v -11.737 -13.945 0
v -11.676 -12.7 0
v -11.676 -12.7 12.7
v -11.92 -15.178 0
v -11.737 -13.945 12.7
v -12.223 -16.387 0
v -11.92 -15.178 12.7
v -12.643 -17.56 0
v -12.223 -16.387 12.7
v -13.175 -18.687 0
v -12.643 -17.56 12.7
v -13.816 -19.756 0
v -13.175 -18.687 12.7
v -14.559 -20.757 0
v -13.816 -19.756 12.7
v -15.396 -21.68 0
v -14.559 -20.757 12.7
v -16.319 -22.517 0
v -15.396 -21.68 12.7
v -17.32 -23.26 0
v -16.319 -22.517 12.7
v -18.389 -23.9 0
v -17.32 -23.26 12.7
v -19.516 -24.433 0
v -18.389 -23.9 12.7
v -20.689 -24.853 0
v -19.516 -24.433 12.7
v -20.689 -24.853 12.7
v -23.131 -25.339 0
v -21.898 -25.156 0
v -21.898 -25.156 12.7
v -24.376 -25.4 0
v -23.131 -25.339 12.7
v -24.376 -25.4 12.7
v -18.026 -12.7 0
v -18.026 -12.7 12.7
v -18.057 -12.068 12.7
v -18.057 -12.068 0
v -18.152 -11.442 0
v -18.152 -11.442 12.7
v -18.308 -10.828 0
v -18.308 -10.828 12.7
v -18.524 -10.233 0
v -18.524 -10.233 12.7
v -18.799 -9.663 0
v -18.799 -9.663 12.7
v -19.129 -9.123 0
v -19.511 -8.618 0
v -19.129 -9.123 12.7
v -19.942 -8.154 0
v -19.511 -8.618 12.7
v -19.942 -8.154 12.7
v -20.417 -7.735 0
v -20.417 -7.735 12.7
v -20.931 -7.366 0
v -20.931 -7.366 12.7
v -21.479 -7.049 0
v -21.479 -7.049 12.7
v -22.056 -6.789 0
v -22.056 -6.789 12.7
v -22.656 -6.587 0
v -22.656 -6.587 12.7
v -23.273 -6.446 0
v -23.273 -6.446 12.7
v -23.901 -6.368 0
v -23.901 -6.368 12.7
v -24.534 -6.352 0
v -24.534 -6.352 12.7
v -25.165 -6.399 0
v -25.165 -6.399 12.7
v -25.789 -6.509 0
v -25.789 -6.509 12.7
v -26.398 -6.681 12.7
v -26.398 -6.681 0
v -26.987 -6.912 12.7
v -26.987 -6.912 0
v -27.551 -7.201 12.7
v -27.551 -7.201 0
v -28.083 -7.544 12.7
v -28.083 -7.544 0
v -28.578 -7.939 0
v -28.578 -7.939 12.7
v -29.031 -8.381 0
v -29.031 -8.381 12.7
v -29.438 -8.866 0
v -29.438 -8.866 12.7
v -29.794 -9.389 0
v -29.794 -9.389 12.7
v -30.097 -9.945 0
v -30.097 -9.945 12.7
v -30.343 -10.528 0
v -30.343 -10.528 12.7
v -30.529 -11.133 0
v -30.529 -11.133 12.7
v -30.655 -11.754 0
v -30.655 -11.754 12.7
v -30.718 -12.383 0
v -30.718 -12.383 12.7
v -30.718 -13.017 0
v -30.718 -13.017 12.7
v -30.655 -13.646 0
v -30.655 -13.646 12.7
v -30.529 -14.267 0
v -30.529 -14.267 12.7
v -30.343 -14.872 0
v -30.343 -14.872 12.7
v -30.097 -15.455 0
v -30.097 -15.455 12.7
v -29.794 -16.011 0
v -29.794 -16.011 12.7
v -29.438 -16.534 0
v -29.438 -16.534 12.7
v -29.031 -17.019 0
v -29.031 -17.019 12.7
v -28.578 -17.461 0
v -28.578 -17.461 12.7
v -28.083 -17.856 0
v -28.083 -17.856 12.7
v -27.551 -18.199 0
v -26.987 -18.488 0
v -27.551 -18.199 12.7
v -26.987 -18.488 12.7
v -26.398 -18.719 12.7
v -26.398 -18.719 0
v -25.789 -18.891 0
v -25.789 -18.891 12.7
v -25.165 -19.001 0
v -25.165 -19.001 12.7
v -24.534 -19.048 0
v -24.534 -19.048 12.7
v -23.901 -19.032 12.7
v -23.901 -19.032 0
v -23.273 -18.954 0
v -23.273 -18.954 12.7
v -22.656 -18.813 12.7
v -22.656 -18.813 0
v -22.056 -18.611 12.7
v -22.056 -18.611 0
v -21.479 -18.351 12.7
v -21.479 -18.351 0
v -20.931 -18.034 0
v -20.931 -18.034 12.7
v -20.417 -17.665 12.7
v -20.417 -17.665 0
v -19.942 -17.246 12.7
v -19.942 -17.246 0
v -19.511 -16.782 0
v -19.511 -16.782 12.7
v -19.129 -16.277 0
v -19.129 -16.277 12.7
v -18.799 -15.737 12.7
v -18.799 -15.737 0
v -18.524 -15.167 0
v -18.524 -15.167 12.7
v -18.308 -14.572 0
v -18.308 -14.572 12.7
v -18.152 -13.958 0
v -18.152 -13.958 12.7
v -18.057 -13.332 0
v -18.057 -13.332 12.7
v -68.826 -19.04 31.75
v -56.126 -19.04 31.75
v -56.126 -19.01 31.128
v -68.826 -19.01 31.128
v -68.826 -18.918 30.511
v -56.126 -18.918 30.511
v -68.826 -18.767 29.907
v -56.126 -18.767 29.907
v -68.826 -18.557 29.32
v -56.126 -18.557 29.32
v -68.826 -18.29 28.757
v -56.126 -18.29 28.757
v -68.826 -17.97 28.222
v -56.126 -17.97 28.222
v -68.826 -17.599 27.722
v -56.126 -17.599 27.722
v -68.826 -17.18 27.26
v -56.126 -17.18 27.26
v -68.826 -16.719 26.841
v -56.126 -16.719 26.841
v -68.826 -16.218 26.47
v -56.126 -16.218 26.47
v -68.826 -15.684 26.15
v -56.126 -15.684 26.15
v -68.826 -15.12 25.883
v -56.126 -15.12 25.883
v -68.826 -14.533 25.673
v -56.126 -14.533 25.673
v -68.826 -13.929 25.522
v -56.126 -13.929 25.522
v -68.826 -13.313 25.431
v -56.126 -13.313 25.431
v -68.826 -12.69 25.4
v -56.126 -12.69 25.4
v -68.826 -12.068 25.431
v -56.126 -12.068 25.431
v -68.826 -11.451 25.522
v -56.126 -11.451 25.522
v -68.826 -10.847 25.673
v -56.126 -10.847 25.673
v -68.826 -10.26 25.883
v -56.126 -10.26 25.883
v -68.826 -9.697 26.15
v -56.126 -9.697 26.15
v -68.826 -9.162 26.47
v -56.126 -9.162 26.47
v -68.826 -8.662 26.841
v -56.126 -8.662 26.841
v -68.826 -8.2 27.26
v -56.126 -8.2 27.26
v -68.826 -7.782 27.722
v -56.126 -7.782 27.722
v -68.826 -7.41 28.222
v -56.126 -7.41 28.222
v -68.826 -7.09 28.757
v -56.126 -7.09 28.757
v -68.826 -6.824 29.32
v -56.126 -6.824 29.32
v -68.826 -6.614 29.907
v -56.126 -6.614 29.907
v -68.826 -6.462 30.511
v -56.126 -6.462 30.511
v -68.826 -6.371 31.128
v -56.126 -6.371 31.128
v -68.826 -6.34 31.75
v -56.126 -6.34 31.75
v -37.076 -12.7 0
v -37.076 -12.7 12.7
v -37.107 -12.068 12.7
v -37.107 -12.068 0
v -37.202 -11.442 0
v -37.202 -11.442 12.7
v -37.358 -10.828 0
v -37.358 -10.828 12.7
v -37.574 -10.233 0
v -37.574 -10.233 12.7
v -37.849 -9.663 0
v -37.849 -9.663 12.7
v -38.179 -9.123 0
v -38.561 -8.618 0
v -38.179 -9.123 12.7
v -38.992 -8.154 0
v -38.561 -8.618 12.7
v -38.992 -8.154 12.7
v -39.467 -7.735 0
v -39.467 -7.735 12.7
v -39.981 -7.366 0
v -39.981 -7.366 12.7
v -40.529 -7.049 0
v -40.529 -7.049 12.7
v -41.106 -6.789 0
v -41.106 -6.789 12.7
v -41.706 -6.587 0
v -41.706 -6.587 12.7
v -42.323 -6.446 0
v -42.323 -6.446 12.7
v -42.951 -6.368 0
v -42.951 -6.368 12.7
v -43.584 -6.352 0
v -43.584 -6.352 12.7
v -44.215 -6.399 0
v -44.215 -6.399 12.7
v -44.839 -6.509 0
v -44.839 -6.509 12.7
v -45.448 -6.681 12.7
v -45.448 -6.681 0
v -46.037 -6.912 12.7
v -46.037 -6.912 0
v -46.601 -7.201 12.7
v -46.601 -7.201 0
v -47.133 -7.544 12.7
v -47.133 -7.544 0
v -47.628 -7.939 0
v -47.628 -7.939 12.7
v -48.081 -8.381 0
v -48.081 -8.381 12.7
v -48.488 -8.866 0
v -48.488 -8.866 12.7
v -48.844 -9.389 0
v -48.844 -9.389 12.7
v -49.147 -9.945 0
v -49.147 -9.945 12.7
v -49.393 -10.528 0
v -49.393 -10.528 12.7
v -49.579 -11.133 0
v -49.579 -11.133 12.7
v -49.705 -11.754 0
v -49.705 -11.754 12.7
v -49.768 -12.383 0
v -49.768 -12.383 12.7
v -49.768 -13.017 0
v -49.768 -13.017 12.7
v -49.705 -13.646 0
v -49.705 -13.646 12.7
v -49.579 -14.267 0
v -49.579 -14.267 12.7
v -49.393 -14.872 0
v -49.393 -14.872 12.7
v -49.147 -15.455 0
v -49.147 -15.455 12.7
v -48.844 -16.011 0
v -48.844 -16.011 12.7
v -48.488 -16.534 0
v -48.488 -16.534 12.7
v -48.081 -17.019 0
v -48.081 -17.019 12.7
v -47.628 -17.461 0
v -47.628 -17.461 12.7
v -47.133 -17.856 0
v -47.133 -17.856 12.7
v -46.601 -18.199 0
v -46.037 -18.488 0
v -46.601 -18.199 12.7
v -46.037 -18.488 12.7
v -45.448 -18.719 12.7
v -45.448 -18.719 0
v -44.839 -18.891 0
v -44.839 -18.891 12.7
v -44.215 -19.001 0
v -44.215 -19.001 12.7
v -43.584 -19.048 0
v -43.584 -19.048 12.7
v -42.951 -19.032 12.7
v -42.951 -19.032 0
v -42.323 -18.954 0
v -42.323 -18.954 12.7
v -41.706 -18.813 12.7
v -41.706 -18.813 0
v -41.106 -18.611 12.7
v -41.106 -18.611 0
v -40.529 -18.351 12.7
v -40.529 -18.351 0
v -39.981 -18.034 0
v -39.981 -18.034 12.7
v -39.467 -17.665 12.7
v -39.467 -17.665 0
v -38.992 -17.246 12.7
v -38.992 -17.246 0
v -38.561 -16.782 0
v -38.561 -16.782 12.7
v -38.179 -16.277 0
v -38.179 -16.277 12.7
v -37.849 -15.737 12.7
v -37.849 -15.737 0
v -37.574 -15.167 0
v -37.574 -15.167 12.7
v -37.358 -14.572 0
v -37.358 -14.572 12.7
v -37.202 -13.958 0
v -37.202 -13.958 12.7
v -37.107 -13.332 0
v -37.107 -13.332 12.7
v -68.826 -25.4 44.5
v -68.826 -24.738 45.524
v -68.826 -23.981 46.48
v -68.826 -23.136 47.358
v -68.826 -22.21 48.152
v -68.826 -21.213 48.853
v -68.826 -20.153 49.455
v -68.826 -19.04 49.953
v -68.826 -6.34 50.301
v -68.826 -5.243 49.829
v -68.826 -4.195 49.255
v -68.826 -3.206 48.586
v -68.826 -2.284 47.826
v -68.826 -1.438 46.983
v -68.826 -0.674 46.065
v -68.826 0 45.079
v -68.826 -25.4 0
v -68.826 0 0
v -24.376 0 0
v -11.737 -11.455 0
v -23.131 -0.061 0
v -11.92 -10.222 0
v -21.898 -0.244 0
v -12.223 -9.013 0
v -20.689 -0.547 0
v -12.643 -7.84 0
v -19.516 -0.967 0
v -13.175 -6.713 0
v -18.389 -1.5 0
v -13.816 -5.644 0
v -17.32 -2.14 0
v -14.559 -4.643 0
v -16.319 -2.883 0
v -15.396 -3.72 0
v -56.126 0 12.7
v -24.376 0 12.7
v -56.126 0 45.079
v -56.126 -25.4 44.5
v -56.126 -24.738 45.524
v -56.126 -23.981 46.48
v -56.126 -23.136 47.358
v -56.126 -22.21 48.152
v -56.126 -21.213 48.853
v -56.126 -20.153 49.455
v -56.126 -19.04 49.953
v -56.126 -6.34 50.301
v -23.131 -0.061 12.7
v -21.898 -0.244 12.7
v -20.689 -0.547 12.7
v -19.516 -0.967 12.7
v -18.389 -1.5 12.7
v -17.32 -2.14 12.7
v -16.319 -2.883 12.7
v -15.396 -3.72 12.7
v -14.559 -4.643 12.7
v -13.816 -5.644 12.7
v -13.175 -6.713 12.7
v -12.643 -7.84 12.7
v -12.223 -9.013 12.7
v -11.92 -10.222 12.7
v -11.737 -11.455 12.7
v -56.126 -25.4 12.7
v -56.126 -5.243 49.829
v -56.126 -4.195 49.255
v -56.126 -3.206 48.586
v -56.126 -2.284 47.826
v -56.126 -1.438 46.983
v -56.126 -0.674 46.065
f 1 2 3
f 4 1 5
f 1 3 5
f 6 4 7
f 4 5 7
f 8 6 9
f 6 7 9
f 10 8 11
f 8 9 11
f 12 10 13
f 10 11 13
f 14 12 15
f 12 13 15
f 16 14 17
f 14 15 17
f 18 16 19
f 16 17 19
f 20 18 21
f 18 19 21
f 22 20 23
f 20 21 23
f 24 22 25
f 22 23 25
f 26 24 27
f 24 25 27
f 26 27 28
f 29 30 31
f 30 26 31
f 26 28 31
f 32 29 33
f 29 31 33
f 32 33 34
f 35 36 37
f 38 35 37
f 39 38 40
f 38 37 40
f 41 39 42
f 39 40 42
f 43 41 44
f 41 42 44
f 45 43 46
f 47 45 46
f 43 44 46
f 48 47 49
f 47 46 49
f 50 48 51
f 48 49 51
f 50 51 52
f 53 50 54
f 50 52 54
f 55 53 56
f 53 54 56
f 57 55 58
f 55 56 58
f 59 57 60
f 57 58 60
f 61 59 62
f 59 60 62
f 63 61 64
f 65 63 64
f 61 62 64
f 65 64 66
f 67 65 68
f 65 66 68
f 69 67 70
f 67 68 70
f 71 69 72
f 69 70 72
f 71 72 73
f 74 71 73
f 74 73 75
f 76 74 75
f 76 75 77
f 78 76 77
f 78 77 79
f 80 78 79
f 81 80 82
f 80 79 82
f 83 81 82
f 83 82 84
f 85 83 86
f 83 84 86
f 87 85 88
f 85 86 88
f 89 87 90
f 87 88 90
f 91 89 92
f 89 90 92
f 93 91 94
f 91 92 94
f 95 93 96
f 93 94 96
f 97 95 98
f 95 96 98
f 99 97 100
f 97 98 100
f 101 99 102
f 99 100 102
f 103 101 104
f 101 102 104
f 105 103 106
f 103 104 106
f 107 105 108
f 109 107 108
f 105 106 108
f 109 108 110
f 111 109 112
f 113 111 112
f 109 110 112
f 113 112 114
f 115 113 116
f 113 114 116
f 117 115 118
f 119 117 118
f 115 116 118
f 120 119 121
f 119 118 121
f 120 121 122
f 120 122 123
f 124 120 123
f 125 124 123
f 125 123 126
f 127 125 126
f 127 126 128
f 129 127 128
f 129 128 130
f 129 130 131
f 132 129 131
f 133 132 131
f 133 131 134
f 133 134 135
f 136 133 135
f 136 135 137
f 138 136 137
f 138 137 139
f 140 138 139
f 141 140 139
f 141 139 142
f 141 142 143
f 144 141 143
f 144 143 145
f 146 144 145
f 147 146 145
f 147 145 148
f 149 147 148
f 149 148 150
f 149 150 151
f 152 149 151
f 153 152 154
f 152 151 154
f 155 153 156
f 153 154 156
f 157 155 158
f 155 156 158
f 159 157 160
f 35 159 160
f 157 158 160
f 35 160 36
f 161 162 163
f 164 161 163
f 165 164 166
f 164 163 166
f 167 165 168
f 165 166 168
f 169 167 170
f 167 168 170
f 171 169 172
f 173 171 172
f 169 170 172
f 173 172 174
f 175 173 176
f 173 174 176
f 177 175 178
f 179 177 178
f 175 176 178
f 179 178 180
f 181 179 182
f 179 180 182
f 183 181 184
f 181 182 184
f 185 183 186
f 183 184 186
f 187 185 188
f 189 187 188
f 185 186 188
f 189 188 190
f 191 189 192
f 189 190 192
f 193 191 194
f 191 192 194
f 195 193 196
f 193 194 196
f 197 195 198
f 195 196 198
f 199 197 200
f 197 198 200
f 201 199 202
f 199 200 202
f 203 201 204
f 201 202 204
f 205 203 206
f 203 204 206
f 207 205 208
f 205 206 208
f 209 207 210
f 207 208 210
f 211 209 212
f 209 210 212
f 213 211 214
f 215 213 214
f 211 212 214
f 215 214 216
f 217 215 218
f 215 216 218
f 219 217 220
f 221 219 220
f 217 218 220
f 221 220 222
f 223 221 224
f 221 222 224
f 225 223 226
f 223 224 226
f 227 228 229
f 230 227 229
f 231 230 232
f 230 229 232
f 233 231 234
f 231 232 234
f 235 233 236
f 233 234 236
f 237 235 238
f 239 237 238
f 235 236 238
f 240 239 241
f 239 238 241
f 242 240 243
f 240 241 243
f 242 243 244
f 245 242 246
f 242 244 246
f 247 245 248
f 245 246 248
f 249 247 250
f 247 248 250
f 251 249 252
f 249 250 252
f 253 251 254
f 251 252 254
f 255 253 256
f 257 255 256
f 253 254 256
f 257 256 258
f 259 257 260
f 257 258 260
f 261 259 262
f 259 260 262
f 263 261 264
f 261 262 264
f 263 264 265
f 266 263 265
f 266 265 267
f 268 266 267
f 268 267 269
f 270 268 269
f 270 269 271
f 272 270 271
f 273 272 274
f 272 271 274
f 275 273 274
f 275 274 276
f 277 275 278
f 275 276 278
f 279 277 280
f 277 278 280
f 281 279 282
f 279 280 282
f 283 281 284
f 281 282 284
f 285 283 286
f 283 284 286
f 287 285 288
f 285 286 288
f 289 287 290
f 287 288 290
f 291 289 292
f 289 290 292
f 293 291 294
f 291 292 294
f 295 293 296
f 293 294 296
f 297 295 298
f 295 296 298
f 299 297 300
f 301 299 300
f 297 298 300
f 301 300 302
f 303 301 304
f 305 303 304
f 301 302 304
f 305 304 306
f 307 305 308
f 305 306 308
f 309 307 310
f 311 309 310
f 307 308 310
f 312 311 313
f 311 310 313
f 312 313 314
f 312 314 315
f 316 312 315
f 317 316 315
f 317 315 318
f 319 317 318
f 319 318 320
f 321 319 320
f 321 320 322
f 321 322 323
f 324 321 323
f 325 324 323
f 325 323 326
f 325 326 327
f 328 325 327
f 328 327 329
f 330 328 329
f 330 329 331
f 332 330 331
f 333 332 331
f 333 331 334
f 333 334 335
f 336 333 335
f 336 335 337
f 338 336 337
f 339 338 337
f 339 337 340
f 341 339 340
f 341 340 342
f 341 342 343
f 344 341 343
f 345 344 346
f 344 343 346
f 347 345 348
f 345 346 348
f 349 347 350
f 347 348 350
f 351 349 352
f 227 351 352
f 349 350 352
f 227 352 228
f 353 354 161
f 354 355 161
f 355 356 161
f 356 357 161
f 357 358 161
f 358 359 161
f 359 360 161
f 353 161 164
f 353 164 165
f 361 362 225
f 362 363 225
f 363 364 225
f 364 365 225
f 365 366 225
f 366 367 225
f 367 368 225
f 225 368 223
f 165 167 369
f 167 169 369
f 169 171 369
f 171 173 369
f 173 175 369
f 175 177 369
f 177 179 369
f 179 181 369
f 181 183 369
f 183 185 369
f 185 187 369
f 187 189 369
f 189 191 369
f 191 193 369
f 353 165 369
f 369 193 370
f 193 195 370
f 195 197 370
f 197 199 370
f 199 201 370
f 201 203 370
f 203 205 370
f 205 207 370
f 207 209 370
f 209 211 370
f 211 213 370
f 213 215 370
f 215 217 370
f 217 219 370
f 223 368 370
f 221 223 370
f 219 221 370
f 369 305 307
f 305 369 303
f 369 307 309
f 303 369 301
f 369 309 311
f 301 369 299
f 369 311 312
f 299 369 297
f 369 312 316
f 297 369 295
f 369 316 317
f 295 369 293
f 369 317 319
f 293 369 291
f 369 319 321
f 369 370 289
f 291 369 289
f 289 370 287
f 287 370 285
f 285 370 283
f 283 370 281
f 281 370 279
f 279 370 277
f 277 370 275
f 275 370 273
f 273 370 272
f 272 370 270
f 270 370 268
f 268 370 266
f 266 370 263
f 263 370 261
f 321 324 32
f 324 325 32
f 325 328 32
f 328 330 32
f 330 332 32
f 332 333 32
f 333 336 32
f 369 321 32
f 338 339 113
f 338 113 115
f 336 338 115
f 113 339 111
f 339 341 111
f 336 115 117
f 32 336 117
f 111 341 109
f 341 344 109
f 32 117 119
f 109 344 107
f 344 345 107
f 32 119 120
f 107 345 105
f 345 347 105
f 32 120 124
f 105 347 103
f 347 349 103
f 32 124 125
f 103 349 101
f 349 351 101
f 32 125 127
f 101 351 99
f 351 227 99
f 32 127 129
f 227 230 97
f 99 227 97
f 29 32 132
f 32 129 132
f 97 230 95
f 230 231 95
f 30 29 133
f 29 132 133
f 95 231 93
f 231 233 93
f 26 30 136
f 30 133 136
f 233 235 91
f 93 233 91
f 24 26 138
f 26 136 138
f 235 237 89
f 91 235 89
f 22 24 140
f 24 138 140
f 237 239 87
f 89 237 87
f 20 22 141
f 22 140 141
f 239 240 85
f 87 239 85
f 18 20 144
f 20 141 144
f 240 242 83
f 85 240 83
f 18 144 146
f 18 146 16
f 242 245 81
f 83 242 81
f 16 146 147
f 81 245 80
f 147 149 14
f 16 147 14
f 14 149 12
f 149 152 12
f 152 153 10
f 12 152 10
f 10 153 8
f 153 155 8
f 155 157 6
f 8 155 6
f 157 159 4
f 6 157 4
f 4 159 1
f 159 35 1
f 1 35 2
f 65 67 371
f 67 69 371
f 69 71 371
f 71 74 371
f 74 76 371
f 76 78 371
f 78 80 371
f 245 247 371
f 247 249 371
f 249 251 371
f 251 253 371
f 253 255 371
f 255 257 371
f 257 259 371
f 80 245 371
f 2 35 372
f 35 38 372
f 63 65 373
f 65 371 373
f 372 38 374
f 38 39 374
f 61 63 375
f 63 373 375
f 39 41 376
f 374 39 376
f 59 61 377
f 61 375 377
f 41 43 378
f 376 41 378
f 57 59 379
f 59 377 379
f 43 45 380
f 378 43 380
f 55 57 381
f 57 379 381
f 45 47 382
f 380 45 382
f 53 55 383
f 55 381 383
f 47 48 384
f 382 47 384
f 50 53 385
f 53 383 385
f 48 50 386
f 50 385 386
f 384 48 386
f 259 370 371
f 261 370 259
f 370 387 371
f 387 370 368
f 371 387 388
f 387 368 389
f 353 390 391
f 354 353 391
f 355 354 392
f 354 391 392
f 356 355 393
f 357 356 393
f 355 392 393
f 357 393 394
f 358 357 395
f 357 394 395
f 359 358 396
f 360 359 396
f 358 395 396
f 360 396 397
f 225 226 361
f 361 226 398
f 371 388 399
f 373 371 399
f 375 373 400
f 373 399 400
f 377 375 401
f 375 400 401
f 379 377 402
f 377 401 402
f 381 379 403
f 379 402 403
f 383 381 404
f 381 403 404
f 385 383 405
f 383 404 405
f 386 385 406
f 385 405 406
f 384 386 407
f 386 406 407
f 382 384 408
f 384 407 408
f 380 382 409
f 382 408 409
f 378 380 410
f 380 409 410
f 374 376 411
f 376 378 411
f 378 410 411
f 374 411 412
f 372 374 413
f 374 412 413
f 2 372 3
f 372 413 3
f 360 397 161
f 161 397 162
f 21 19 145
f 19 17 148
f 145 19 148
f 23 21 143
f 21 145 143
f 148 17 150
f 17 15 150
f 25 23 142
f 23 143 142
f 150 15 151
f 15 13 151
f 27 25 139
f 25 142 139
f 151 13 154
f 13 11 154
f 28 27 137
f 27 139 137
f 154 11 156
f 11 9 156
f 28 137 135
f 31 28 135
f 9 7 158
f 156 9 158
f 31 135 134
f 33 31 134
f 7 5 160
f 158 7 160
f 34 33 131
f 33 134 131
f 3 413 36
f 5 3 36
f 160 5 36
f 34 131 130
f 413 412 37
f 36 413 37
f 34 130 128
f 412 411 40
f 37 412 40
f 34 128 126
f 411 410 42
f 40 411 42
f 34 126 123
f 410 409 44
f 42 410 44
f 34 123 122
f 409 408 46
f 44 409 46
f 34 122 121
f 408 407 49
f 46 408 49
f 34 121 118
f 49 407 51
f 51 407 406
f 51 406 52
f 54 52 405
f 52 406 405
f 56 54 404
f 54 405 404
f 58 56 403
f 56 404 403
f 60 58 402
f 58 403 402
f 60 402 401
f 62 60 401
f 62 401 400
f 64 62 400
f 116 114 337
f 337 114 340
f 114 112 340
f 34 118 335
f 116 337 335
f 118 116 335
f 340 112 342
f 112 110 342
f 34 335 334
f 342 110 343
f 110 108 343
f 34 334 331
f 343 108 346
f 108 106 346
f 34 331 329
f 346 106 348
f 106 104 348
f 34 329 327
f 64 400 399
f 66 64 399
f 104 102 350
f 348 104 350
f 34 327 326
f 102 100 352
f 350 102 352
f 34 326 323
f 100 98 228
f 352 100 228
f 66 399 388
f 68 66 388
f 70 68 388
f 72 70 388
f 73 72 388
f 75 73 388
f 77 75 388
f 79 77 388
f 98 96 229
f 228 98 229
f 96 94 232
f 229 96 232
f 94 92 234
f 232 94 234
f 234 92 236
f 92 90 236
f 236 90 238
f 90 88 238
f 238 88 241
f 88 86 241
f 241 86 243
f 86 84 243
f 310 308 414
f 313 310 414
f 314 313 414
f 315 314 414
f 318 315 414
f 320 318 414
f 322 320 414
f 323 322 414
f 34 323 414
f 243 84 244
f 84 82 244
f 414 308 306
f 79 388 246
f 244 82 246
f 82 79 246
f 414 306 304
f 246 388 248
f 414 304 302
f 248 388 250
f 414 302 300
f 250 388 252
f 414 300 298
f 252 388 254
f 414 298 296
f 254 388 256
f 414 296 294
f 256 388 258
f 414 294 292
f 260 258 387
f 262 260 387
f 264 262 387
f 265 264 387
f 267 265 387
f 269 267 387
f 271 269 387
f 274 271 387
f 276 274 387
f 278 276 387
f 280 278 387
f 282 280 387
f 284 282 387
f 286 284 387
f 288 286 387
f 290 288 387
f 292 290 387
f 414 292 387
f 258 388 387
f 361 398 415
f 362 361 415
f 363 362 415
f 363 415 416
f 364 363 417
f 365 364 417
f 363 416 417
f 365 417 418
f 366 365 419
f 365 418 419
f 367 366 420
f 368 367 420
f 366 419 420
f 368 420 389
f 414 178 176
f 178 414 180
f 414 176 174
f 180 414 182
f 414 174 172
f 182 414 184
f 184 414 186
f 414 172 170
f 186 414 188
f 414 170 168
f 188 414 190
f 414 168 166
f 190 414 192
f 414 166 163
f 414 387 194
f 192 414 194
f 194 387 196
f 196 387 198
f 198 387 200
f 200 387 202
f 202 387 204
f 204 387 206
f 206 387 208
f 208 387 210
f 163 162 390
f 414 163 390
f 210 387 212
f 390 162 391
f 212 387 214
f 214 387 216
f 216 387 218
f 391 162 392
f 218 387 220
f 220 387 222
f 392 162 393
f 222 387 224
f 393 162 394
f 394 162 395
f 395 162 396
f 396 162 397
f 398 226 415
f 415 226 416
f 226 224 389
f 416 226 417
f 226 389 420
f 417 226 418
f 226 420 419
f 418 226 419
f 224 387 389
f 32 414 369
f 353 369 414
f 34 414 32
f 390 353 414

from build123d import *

# Parameters (mm, degrees)
F1_DEPTH = 25.4
F2_R     = 6.35
F3_DEPTH = 12.7
F5_DEPTH = 25.4
F7_DEPTH = 12.7
F9_DEPTH = 12.7


with BuildPart() as f1:
    # F0 (on Front) → F1 (new body)
    with BuildSketch(Plane.XZ):
        Polygon((-56.1258053064, 50.8), (-68.8258053064, 50.8), (-68.8258053064, 0), (-11.6758053064, 0), (-11.6758053064, 12.7), (-56.1258053064, 12.7), align=None)
    extrude(amount=F1_DEPTH)

    # F2 (on face) → F3 (cut)
    with BuildSketch(Plane.XY.offset(12.7)):
        with Locations((-43.4258053064, -12.7)):
            Circle(F2_R)
        with Locations((-24.3758053064, -12.7)):
            Circle(F2_R)
    extrude(amount=-F3_DEPTH, mode=Mode.SUBTRACT)

    # F4 (on face) → F5 (cut)
    with BuildSketch(Plane.XY.offset(12.7)):
        with BuildLine():
            ThreePointArc((-24.3758053064, 0), (-15.3955491853, -3.7197438789), (-11.6758053064, -12.7))
            Line((-11.6758053064, -12.7), (-11.6758053064, 0))
            Line((-11.6758053064, 0), (-24.3758053064, 0))
        make_face()
        with BuildLine():
            Line((-11.6758053064, -25.4), (-11.6758053064, -12.7))
            ThreePointArc((-11.6758053064, -12.7), (-15.3955491853, -21.6802561211), (-24.3758053064, -25.4))
            Line((-24.3758053064, -25.4), (-11.6758053064, -25.4))
        make_face()
    extrude(amount=-F5_DEPTH, mode=Mode.SUBTRACT)

    # F6 (on face) → F7 (cut)
    with BuildSketch(Plane.YZ.offset(-56.1258053064)):
        with BuildLine():
            ThreePointArc((-19.040173462, 31.75), (-12.690173462, 38.1), (-6.340173462, 31.75))
            Line((-6.340173462, 31.75), (-6.340173462, 50.8))
            Line((-6.340173462, 50.8), (-19.040173462, 50.8))
            Line((-19.040173462, 50.8), (-19.040173462, 31.75))
        make_face()
        with BuildLine():
            ThreePointArc((-19.040173462, 31.75), (-12.690173462, 25.4), (-6.340173462, 31.75))
            ThreePointArc((-6.340173462, 31.75), (-12.690173462, 38.1), (-19.040173462, 31.75))
        make_face()
    extrude(amount=-F7_DEPTH, mode=Mode.SUBTRACT)

    # F8 (on face) → F9 (cut)
    with BuildSketch(Plane.YZ.offset(-56.1258053064)):
        with BuildLine():
            ThreePointArc((-25.4, 44.5000978606), (-22.682681328, 47.7661903137), (-19.040173462, 49.9532699015))
            Line((-19.040173462, 49.9532699015), (-19.040173462, 50.8))
            Line((-19.040173462, 50.8), (-25.4, 50.8))
            Line((-25.4, 50.8), (-25.4, 44.5000978606))
        make_face()
        with BuildLine():
            Line((-6.340173462, 50.8), (-6.340173462, 50.3012942354))
            ThreePointArc((-6.340173462, 50.3012942354), (-2.7361670375, 48.2166562079), (0, 45.0785089908))
            Line((0, 45.0785089908), (0, 50.8))
            Line((0, 50.8), (-6.340173462, 50.8))
        make_face()
    extrude(amount=-F9_DEPTH, mode=Mode.SUBTRACT)


solid = f1.part
